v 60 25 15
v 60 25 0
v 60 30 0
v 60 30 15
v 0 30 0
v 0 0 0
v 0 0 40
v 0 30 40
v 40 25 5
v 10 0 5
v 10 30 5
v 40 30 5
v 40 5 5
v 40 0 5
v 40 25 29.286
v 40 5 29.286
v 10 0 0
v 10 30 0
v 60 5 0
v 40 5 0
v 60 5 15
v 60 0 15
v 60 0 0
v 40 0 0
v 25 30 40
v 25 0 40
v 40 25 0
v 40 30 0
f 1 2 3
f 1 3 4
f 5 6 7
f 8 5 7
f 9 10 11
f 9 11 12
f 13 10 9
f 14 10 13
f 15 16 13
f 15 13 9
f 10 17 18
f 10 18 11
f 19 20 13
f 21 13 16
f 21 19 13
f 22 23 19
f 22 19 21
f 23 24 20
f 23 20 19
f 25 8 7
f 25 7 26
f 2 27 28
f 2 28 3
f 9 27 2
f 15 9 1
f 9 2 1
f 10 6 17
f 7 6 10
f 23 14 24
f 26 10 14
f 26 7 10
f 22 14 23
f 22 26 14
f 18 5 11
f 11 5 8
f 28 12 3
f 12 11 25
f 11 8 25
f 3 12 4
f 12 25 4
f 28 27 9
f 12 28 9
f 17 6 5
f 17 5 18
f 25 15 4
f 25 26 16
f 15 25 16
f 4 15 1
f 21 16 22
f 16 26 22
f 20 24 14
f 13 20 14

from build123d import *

# Parameters (mm, degrees)
F0_W     = 60
F0_H     = 40
F1_DEPTH = 30
F2_W     = 30
F2_H     = 5
F3_DEPTH = 30.001
F5_W     = 20
F5_H     = 30
F6_DEPTH = 20


with BuildPart() as f1:
    # F0 (on Front) → F1 (new body)
    with BuildSketch(Plane.XZ):
        with Locations((30, 20)):
            Rectangle(F0_W, F0_H)
    extrude(amount=-F1_DEPTH)

    # F2 (on face) → F3 (cut, through all)
    with BuildSketch(Plane.XZ):
        with Locations((25, 2.5)):
            Rectangle(F2_W, F2_H)
        Polygon((60, 40), (25, 40), (60, 15), align=None)
    extrude(amount=-F3_DEPTH, mode=Mode.SUBTRACT)

    # F5 (on offset) → F6 (cut)
    with BuildSketch(Plane.YZ.offset(60)):
        with Locations((15, 15)):
            Rectangle(F5_W, F5_H)
    extrude(amount=-F6_DEPTH, mode=Mode.SUBTRACT)


solid = f1.part
